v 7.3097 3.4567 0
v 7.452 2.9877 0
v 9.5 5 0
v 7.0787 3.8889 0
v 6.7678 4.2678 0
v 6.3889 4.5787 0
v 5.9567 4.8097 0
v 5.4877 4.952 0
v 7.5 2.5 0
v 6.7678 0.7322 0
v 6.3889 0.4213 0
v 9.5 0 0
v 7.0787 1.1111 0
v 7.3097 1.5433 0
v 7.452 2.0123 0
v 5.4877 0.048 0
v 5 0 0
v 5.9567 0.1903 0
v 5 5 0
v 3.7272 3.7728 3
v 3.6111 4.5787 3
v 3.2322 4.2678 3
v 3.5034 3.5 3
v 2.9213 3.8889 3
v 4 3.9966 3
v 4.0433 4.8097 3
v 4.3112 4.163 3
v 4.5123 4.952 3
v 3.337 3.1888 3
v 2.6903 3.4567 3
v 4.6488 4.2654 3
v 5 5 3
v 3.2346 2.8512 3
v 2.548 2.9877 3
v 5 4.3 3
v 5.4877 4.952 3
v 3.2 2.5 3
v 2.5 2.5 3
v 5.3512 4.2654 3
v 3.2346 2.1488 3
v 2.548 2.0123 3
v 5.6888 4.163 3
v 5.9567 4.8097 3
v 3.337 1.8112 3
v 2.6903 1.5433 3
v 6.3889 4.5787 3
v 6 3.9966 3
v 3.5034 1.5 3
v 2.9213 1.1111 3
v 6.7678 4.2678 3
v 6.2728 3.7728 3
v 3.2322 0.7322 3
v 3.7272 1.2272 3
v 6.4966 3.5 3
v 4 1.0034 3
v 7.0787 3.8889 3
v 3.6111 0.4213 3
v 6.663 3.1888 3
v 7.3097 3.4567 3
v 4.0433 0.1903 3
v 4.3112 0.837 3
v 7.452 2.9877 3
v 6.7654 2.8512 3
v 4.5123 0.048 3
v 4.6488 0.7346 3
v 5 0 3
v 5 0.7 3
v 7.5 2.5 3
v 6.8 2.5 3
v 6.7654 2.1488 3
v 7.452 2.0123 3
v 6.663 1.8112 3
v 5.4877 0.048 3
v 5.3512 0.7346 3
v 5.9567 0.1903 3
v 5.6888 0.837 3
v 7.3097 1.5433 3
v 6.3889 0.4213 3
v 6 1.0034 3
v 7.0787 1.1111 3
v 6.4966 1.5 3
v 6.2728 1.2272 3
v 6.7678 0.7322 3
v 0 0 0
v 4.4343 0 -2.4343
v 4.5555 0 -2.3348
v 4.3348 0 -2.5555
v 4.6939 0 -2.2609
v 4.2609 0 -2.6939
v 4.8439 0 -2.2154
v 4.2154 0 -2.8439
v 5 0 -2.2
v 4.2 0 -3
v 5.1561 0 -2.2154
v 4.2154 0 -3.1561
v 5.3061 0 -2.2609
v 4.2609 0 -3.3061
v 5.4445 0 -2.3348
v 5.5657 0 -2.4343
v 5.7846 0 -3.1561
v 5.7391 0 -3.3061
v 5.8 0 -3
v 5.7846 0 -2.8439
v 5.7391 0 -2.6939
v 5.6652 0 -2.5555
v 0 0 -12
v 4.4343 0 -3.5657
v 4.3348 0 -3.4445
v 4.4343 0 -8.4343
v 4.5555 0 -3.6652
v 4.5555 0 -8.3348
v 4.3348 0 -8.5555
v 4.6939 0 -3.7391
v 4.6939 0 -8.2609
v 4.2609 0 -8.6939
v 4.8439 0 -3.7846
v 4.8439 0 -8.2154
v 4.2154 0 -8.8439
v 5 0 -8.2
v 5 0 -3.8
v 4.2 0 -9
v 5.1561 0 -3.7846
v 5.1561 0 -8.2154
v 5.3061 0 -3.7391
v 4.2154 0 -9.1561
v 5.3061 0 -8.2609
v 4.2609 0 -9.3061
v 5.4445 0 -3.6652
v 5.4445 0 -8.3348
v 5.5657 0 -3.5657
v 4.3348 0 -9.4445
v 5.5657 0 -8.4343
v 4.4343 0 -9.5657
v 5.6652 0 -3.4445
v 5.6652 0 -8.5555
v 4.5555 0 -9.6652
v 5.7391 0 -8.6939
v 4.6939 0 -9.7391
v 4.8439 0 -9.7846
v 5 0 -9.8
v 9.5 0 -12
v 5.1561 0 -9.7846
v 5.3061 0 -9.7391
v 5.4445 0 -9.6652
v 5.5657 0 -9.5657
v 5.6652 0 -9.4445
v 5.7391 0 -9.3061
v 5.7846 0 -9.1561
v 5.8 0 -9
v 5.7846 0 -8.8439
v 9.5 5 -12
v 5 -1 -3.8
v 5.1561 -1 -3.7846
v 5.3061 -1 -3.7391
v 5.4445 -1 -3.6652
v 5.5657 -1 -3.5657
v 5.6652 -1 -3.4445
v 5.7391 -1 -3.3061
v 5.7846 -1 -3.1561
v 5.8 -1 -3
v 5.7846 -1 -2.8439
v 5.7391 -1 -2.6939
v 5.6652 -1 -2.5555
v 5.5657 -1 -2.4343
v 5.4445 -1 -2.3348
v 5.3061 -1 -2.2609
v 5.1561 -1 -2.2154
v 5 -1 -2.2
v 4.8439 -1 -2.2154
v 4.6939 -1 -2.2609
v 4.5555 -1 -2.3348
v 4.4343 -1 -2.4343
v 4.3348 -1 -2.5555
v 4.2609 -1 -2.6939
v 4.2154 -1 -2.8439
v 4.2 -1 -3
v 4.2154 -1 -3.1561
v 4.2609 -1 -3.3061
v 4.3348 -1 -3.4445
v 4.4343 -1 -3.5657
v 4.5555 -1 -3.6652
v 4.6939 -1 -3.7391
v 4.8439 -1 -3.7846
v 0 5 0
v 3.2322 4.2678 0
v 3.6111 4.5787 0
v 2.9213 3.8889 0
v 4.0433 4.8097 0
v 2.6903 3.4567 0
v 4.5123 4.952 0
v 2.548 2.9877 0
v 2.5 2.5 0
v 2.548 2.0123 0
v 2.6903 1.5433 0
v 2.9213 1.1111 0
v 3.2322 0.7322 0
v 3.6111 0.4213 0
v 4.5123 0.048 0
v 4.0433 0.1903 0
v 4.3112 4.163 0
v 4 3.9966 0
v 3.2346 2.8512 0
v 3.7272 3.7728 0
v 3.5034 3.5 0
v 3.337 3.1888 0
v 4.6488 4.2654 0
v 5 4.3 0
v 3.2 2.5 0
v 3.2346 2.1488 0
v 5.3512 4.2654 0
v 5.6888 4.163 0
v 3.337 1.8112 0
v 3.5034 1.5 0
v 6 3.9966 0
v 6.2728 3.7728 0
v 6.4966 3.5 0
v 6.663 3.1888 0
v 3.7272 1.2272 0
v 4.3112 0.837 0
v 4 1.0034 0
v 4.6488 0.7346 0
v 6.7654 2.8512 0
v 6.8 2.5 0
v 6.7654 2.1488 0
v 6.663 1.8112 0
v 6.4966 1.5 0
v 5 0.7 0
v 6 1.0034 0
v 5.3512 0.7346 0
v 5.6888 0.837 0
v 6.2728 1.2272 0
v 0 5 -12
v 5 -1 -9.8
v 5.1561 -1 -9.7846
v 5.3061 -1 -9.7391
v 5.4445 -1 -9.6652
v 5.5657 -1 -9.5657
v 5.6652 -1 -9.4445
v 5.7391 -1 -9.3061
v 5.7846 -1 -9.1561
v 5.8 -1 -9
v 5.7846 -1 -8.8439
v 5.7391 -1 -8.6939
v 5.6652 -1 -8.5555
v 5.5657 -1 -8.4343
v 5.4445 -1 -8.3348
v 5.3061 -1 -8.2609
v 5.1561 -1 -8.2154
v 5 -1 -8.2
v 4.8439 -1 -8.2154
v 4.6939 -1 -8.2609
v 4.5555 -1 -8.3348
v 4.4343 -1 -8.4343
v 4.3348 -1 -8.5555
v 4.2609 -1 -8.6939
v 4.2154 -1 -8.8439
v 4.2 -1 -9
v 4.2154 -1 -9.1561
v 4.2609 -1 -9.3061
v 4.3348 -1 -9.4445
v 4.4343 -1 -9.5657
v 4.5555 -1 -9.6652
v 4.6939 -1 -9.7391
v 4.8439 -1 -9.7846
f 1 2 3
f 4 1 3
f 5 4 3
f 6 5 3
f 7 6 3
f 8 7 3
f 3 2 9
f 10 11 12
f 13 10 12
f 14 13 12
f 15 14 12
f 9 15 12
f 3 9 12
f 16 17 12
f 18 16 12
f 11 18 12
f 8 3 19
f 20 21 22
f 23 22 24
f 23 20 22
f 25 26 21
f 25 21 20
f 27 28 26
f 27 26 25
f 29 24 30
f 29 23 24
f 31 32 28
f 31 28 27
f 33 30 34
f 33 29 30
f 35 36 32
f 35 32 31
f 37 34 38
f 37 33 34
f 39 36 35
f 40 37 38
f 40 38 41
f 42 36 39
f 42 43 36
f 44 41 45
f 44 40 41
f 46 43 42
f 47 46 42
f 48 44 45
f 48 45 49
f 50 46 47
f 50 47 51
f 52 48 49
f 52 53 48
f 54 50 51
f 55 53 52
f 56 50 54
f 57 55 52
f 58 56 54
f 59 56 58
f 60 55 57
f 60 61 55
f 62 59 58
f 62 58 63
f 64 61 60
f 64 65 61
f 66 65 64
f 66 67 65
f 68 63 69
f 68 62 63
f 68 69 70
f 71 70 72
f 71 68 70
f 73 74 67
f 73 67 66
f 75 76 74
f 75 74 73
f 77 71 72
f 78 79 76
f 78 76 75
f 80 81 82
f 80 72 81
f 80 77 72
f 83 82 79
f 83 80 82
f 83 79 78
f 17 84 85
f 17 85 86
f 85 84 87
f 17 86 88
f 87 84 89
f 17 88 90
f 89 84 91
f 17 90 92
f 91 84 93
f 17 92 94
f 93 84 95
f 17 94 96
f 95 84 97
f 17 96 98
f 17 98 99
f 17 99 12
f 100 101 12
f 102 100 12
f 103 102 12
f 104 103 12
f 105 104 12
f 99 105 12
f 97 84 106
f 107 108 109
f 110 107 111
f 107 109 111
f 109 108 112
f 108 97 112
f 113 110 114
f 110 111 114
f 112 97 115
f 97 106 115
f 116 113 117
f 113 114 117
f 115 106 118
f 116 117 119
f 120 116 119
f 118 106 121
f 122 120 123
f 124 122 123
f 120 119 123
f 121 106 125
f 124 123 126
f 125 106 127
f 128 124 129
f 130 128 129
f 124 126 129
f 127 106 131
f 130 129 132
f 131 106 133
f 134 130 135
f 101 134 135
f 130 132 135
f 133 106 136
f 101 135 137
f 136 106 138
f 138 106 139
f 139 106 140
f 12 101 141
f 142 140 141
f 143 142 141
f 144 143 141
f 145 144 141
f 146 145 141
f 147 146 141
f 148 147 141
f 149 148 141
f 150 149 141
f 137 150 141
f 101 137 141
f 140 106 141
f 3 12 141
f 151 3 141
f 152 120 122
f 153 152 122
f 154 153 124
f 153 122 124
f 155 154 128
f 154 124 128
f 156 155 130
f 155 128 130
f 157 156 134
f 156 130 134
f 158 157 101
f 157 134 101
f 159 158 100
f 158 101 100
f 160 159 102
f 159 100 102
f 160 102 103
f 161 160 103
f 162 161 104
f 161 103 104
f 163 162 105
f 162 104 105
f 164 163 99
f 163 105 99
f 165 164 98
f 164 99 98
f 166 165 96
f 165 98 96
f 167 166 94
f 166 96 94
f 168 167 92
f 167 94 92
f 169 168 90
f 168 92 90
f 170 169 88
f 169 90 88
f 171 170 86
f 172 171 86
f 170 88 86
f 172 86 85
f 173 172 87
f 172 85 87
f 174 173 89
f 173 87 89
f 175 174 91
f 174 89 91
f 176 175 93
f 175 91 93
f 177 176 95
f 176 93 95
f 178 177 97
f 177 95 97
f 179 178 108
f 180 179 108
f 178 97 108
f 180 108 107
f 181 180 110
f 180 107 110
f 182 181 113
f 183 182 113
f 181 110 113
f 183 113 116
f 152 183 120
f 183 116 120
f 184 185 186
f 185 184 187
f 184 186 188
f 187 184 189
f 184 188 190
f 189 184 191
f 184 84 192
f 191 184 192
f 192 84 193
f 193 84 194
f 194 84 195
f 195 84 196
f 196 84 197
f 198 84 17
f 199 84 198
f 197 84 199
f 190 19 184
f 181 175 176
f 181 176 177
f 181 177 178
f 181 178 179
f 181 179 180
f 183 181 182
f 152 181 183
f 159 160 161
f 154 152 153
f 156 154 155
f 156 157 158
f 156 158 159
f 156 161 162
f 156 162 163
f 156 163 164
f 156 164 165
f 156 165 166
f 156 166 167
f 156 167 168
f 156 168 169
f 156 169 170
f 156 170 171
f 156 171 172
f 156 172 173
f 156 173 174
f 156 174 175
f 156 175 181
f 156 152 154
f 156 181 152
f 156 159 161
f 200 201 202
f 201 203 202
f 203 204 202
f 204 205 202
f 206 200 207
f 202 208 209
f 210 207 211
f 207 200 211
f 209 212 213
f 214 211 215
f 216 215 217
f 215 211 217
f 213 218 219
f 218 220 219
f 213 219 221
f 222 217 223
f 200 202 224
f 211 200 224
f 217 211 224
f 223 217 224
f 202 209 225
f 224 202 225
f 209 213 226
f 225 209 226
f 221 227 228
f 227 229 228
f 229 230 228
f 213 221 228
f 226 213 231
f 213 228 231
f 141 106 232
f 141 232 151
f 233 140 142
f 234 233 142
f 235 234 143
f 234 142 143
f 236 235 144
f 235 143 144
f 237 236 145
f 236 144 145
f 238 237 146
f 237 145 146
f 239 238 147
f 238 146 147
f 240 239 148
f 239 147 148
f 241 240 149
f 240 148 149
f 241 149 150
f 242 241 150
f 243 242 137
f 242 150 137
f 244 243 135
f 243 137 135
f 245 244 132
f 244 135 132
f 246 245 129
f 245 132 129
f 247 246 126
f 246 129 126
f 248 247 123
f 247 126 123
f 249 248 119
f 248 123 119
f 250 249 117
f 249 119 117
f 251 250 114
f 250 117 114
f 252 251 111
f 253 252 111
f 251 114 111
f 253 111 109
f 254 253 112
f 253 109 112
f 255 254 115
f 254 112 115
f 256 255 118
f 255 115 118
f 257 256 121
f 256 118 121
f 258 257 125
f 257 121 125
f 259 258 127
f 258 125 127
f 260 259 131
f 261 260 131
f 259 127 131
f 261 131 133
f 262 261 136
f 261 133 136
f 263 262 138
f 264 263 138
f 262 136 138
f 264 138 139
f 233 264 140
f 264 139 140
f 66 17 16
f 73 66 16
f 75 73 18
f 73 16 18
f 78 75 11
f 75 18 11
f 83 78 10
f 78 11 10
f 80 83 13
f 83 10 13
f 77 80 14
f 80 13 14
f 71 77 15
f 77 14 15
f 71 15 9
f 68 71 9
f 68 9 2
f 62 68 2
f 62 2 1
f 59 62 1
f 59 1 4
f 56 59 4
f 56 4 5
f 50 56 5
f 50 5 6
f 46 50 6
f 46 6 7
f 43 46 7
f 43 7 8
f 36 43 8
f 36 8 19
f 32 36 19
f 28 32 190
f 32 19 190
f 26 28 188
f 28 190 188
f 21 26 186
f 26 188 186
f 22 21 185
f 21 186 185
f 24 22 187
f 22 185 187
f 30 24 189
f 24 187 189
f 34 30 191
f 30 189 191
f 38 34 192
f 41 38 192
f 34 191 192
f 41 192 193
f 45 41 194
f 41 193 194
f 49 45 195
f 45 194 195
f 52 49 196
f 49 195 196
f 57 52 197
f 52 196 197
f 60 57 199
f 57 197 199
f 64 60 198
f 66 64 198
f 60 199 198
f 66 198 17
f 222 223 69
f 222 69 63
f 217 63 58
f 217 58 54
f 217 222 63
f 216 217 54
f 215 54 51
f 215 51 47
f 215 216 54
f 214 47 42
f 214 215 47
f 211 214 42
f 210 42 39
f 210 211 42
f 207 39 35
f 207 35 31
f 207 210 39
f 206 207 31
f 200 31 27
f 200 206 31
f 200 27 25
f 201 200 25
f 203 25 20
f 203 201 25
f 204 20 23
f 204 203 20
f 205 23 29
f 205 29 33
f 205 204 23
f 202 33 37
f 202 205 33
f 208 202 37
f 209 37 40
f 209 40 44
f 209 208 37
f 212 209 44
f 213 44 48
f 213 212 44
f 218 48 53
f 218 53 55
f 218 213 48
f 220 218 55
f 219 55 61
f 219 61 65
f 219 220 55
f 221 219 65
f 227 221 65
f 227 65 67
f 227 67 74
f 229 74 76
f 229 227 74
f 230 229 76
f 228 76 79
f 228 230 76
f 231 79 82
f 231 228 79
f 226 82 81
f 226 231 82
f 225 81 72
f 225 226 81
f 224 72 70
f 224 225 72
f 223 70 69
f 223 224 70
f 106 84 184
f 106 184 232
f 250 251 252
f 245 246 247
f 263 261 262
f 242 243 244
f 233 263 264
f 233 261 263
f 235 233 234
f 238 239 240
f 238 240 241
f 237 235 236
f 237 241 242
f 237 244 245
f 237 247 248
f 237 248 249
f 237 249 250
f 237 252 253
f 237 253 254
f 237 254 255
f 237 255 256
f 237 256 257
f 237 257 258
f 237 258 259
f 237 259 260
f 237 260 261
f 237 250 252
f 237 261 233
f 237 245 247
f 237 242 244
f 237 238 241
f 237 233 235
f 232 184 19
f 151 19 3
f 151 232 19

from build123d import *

# Parameters (mm, degrees)
SKETCH1_W           = 9.5
SKETCH1_H           = 12
BOSS_EXTRUDE1_DEPTH = 5
SKETCH2_R           = 2.5
SKETCH2_R_2         = 1.8
BOSS_EXTRUDE2_DEPTH = 3
SKETCH3_R           = 0.8
BOSS_EXTRUDE3_DEPTH = 1


with BuildPart() as part:
    # Sketch1 → Boss-Extrude1 (new body)
    with BuildSketch(Plane(origin=(0, 0, 0), x_dir=(1, 0, 0), z_dir=(0, 1, 0))):
        with Locations((4.75, 6)):
            Rectangle(SKETCH1_W, SKETCH1_H)
    extrude(amount=BOSS_EXTRUDE1_DEPTH)

    # Sketch2 → Boss-Extrude2 (add)
    with BuildSketch(Plane.XY):
        with Locations(Location((5, 2.5, 0), (0, 0, 270))):
            Circle(SKETCH2_R)
        with Locations((5, 2.5)):
            Circle(SKETCH2_R_2, mode=Mode.SUBTRACT)
    extrude(amount=BOSS_EXTRUDE2_DEPTH)

    # Sketch3 → Boss-Extrude3 (add)
    with BuildSketch(Plane.XZ):
        with Locations(Location((5, -3, 0), (0, 0, 270))):
            Circle(SKETCH3_R)
        with Locations(Location((5, -9, 0), (0, 0, 270))):
            Circle(SKETCH3_R)
    extrude(amount=BOSS_EXTRUDE3_DEPTH)


solid = part.part
